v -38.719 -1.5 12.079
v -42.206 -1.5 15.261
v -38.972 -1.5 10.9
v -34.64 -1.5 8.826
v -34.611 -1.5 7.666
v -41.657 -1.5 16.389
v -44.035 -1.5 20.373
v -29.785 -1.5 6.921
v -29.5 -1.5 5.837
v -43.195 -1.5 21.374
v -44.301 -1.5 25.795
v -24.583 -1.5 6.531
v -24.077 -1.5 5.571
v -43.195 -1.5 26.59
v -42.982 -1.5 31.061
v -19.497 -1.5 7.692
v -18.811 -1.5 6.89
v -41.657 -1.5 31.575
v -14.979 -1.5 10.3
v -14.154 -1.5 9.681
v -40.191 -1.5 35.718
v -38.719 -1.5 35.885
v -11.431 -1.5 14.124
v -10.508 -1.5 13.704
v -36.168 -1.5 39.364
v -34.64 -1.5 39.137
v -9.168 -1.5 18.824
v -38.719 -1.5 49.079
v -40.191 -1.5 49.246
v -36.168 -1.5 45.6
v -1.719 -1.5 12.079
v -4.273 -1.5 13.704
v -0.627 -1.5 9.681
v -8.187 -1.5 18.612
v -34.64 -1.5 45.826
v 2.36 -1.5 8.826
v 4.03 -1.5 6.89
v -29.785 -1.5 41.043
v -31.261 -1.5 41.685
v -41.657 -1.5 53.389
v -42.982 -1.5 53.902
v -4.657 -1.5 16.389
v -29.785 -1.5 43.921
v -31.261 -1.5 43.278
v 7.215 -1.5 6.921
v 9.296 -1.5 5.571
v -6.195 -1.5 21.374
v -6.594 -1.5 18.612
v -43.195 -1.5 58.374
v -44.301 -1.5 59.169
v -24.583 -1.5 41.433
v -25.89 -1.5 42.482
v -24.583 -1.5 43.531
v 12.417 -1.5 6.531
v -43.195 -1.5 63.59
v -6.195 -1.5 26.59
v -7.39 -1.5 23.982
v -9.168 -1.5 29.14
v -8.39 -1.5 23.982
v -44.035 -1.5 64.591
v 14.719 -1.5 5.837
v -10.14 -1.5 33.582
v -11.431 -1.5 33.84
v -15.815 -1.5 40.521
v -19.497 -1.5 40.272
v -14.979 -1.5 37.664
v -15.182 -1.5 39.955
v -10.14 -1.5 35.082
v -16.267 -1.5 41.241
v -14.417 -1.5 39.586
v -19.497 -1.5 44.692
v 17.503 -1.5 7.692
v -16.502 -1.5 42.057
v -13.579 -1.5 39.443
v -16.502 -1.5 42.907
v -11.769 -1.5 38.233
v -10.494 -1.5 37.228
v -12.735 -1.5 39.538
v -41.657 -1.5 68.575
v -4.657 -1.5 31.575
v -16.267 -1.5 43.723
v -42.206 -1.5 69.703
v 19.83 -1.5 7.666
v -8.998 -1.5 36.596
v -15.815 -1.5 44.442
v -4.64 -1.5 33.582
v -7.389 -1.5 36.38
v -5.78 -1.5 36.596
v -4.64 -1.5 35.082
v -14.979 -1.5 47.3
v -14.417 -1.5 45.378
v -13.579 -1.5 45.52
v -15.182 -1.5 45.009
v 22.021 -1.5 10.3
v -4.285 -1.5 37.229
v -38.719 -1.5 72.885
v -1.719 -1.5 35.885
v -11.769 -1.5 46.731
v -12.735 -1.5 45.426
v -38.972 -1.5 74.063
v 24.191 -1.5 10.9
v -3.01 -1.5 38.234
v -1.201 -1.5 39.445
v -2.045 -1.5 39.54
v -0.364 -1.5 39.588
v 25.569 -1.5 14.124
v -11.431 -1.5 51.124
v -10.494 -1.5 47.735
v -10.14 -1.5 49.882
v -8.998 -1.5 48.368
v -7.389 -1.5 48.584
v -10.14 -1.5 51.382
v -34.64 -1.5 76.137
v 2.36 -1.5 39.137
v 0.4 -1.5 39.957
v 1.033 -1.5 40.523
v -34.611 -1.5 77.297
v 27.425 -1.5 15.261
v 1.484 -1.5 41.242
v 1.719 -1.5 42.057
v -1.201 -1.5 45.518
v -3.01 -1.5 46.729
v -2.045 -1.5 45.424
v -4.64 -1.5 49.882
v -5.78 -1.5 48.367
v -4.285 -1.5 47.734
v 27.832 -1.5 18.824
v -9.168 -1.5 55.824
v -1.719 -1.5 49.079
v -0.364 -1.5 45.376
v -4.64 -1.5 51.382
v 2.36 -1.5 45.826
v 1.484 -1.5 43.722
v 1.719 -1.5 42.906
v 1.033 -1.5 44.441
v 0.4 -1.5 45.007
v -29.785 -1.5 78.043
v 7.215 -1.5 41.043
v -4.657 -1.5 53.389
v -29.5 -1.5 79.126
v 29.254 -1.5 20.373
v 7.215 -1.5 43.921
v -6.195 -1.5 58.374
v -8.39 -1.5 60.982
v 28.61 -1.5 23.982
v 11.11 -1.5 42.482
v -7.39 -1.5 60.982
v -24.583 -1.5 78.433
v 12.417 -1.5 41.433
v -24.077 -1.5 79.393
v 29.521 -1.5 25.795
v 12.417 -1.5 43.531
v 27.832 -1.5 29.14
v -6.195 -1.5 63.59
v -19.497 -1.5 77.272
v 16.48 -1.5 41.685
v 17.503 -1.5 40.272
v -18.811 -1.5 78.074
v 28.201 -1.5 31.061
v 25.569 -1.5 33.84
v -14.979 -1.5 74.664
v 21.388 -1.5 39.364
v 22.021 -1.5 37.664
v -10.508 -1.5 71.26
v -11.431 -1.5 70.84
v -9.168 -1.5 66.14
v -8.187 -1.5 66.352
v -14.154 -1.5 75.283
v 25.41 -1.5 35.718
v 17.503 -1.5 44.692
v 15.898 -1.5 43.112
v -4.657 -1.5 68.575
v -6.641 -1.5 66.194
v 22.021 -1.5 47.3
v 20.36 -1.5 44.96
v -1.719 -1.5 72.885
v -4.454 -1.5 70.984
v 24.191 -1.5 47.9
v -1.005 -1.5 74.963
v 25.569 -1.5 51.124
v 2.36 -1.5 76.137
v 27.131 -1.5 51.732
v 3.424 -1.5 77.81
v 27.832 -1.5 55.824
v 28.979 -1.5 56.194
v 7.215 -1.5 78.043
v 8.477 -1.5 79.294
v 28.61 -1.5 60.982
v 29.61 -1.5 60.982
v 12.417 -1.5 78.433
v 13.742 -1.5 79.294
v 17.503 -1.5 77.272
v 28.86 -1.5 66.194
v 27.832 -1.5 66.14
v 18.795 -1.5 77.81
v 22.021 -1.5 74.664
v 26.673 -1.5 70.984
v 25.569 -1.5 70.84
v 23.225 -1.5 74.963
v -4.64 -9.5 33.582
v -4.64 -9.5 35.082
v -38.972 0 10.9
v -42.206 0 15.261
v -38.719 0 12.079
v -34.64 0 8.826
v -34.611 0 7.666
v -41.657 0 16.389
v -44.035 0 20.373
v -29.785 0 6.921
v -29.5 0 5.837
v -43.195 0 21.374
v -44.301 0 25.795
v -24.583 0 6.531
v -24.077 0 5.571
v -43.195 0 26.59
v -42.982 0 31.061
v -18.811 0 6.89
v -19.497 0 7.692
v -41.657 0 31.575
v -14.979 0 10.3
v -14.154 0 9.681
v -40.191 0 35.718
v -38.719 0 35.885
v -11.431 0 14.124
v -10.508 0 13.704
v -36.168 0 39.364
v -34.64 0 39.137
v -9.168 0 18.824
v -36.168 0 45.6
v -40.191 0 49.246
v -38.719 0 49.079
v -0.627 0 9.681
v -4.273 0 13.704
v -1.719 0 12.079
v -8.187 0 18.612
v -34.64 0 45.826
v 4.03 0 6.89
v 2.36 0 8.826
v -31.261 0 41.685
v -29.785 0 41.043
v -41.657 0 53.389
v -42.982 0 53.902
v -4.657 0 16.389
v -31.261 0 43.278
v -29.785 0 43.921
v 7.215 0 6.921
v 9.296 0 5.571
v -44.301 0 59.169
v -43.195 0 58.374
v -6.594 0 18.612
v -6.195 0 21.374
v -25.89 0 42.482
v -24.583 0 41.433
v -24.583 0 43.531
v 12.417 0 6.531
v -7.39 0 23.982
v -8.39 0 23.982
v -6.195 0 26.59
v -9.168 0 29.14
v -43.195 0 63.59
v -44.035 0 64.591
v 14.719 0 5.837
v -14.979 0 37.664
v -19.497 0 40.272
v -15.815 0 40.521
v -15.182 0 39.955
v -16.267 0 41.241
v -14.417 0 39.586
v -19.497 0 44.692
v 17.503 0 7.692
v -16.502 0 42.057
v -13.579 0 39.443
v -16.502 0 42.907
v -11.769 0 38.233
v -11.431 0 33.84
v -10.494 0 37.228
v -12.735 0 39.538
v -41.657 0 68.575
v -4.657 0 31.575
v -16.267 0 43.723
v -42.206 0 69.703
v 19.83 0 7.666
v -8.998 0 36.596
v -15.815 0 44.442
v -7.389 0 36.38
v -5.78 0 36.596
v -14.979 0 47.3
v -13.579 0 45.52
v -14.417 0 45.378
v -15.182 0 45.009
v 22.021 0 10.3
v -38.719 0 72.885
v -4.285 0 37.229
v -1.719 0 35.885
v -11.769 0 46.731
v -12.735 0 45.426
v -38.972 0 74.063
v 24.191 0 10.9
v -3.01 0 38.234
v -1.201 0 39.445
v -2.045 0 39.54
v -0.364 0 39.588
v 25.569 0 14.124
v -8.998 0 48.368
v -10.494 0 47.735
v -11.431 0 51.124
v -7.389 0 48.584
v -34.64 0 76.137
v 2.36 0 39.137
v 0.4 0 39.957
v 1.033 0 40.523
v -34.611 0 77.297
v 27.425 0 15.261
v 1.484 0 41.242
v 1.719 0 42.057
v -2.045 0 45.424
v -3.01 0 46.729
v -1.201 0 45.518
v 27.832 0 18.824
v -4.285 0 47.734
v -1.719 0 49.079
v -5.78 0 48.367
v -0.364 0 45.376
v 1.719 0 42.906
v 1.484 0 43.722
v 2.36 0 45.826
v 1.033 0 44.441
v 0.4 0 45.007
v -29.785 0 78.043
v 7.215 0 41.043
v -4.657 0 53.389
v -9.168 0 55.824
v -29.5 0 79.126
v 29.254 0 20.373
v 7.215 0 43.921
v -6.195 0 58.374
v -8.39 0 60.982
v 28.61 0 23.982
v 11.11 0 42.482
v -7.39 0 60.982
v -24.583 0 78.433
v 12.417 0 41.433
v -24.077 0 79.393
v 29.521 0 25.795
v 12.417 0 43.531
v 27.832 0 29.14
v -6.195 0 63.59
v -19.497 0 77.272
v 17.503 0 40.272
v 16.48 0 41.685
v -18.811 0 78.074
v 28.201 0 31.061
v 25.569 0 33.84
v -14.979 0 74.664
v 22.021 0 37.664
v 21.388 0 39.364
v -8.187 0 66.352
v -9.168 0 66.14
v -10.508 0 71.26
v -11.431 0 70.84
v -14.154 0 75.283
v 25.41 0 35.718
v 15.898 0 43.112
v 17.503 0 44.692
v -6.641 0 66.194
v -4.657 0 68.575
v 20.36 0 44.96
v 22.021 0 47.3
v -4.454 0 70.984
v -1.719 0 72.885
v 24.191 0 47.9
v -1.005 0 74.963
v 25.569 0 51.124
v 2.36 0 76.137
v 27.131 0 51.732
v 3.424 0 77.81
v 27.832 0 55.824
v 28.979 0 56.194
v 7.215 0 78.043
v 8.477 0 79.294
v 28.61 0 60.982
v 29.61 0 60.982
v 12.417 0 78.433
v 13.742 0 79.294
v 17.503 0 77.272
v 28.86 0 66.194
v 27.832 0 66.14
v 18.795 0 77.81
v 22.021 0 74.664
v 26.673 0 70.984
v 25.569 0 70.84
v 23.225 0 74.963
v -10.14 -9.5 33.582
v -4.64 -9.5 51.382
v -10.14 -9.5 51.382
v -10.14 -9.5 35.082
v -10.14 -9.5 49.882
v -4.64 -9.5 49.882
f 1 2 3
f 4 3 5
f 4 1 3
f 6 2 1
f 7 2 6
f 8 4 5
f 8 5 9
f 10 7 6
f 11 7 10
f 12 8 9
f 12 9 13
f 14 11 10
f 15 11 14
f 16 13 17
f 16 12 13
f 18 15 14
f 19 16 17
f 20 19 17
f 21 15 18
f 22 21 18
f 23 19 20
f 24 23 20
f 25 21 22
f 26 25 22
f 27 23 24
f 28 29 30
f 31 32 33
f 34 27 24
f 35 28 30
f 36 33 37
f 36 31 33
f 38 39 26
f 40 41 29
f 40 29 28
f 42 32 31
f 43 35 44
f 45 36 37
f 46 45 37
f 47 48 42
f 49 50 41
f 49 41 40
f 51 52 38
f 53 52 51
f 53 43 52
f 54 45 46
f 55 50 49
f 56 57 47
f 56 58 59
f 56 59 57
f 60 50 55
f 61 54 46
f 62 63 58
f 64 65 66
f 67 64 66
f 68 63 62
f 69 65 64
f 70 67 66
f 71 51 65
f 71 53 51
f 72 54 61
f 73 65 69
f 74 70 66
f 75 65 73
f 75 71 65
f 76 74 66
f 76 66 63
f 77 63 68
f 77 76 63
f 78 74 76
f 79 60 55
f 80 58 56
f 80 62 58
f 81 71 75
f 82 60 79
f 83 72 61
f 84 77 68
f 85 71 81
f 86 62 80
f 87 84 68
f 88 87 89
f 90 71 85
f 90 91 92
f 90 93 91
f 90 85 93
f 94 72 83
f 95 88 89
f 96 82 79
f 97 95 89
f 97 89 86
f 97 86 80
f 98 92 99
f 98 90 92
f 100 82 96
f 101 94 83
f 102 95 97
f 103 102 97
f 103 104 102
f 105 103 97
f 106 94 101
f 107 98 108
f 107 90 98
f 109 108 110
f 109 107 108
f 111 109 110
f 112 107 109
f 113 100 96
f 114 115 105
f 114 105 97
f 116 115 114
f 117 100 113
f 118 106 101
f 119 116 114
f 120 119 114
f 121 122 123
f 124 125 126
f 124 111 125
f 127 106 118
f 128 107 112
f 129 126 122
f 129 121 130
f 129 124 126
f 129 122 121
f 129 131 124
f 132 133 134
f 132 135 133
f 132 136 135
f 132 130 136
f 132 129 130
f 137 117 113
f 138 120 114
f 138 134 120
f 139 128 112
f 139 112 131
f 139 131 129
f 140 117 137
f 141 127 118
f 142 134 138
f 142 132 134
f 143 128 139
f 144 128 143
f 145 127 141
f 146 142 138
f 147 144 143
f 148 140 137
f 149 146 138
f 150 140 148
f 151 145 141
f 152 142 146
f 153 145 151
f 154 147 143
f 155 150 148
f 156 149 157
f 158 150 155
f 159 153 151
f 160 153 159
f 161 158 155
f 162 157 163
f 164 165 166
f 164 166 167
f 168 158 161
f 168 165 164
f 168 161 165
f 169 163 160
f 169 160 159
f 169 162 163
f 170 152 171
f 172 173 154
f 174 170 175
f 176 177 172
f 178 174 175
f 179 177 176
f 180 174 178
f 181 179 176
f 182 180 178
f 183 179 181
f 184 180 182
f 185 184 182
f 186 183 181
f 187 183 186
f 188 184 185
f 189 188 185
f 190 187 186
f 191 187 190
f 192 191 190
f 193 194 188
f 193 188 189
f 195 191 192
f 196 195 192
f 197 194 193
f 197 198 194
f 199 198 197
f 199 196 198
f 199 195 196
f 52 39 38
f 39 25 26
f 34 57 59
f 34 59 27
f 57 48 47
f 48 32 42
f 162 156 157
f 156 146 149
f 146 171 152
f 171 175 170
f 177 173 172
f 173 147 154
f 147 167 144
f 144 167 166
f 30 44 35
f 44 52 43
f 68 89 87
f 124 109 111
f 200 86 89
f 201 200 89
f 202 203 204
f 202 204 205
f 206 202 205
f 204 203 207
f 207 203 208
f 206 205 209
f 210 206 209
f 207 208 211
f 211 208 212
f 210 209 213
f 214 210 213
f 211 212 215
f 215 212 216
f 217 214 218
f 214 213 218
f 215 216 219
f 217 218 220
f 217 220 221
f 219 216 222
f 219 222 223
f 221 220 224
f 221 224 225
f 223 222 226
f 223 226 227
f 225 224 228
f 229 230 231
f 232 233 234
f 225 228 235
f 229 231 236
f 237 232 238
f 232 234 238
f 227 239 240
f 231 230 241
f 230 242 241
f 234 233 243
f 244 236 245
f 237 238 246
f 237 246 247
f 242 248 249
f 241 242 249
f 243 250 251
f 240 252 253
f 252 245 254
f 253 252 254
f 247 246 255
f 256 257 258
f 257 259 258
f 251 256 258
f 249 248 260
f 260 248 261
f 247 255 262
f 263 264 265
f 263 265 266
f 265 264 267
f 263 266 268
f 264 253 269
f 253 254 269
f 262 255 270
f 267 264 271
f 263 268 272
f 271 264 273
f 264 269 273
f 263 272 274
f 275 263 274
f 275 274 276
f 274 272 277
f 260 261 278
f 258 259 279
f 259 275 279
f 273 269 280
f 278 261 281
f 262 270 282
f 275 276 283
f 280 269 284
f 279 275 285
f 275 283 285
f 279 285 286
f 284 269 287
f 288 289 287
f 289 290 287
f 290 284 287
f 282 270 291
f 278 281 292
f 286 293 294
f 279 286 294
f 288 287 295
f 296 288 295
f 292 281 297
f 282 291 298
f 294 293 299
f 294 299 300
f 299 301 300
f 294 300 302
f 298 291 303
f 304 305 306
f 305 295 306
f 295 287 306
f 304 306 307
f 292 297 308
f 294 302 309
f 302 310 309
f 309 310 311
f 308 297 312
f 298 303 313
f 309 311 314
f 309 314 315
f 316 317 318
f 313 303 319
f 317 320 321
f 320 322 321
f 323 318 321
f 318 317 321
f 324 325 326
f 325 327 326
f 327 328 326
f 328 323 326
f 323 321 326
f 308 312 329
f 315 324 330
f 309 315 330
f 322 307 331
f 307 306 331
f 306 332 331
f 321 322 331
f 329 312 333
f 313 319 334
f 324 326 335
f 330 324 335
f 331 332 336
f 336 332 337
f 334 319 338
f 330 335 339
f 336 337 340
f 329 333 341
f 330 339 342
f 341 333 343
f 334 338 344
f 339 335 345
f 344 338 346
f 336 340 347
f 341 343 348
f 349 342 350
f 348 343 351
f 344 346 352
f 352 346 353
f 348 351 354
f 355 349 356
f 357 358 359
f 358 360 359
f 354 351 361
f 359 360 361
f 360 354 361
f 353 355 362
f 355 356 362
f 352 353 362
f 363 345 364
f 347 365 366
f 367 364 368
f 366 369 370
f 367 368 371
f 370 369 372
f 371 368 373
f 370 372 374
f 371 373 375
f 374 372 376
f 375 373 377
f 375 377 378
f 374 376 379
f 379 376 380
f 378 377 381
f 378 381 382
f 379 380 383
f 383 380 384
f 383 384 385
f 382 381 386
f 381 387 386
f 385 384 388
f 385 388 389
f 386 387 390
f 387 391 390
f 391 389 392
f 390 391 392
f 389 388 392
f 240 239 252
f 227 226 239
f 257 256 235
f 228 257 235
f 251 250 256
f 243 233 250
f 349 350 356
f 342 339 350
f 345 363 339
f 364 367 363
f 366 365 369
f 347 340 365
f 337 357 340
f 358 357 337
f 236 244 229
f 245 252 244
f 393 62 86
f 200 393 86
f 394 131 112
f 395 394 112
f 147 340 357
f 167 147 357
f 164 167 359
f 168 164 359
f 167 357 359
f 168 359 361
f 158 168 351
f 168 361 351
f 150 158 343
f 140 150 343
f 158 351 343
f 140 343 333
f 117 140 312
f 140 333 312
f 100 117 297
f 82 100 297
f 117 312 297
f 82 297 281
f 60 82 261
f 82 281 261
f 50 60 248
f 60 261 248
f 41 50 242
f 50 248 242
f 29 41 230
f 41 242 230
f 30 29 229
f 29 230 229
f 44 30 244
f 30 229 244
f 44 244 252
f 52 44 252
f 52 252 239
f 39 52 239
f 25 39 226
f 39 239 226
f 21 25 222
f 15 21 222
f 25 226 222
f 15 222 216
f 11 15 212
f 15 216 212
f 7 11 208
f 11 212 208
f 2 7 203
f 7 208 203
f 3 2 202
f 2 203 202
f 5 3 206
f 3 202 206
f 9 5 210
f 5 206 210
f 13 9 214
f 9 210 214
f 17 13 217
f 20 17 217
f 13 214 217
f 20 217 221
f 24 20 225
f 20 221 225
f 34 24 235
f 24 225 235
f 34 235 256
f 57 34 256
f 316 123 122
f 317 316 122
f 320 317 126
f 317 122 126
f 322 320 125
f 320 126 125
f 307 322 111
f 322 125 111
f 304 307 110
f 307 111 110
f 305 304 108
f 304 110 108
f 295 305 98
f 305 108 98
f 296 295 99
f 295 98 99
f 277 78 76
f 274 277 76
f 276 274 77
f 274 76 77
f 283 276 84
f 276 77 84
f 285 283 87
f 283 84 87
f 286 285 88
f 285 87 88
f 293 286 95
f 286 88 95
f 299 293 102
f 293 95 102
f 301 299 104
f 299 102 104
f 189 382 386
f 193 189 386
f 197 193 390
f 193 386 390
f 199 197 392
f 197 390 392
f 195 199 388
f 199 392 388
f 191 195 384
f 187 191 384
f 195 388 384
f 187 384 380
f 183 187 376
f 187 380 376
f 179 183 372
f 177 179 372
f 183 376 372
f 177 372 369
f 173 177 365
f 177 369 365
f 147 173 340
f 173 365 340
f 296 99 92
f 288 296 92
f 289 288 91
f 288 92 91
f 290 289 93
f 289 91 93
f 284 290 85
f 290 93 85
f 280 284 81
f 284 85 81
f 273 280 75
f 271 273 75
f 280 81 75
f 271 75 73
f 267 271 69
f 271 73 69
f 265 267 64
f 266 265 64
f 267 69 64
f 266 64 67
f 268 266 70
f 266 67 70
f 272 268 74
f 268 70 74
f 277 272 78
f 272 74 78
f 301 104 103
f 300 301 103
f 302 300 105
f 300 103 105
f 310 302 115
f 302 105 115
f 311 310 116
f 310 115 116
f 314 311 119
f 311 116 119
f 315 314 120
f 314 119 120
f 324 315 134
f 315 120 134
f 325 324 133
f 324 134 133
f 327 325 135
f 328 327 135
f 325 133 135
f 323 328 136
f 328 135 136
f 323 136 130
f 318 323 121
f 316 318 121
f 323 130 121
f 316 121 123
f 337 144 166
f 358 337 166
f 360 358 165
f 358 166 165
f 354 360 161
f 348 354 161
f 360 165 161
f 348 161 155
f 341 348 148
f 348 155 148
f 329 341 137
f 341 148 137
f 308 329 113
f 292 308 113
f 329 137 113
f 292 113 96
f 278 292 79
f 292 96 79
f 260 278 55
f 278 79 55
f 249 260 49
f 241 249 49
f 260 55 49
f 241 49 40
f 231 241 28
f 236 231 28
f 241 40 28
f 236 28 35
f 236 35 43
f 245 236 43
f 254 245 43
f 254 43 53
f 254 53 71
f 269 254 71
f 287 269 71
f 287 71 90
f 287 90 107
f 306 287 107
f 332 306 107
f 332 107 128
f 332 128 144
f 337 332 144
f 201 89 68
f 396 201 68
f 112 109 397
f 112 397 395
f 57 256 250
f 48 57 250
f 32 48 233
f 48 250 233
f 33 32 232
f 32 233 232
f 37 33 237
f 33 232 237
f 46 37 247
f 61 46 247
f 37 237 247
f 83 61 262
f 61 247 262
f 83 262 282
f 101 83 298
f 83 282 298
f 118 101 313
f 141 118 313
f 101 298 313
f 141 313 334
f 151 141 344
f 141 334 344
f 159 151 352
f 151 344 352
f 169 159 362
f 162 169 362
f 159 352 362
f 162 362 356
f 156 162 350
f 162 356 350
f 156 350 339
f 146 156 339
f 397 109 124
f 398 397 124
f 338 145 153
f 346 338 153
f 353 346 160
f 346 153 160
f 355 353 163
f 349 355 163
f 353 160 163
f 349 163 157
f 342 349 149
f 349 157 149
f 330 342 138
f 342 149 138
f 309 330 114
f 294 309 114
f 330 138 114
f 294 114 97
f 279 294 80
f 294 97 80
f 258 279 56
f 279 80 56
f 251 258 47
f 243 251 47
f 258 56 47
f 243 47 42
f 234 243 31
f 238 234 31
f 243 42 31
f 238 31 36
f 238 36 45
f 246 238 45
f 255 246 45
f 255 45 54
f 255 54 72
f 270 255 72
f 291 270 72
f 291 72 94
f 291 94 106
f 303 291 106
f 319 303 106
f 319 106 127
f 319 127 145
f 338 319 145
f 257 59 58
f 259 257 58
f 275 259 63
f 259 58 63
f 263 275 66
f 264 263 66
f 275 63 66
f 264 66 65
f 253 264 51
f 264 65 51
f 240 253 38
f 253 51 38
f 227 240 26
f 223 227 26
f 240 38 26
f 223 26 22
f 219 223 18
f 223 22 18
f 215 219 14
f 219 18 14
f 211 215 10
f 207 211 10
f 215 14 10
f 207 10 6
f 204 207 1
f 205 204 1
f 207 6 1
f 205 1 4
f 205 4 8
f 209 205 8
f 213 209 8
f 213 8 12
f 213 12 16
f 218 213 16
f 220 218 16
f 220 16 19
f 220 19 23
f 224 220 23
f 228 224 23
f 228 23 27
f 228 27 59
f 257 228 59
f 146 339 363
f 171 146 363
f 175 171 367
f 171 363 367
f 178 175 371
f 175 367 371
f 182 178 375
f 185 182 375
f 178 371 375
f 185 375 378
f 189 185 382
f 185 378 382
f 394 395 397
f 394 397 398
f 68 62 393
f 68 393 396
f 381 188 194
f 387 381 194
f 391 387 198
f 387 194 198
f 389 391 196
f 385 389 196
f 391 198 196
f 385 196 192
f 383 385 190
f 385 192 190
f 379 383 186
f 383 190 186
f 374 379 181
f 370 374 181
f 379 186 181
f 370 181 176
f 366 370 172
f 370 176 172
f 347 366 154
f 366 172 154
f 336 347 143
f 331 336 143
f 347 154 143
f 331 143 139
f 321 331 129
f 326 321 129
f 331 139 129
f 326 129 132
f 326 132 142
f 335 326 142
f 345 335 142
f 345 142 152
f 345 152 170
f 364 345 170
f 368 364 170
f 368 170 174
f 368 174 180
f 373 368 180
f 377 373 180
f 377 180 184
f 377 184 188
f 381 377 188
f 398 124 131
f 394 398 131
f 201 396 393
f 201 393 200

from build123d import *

# Parameters (mm, degrees)
F1_DEPTH = 1.5
F2_R     = 17.5
F3_DEPTH = 1.501
F4_W     = 2.75
F4_H     = 1.5
F5_DEPTH = 8
F7_DEPTH = 1.501


with BuildPart() as f1:
    # F0 (on Front) → F1 (new body)
    with BuildSketch(Plane.XZ):
        with BuildLine():
            ThreePointArc((-25.8904117895, 42.4818245173), (-38.971887268, 10.9003490722), (-7.3904118091, 23.9818245173))
            ThreePointArc((-7.3904118091, 23.9818245173), (-12.8089363502, 37.0632999623), (-25.8904117895, 42.4818245173))
        make_face()
        with BuildLine():
            ThreePointArc((11.1095881909, 42.4818245173), (-1.971887261, 37.0632999692), (-7.3904118091, 23.9818245173))
            ThreePointArc((-7.3904118091, 23.9818245173), (11.1095881909, 5.4818245173), (29.6095881909, 23.9818245173))
            ThreePointArc((29.6095881909, 23.9818245173), (24.1910636429, 37.0632999692), (11.1095881909, 42.4818245173))
        make_face()
        with BuildLine():
            ThreePointArc((-25.8904117895, 42.4818245173), (-12.8089363502, 37.0632999623), (-7.3904118091, 23.9818245173))
            ThreePointArc((-7.3904118091, 23.9818245173), (-1.971887261, 37.0632999692), (11.1095881909, 42.4818245173))
            ThreePointArc((11.1095881909, 42.4818245173), (-1.971887261, 47.9003490653), (-7.3904118091, 60.9818245173))
            ThreePointArc((-7.3904118091, 60.9818245173), (-12.8089363502, 47.9003490722), (-25.8904117895, 42.4818245173))
        make_face()
        with BuildLine():
            ThreePointArc((-7.3904118091, 60.9818245173), (-38.971887268, 74.0632999623), (-25.8904117895, 42.4818245173))
            ThreePointArc((-25.8904117895, 42.4818245173), (-12.8089363502, 47.9003490722), (-7.3904118091, 60.9818245173))
        make_face()
        with BuildLine():
            ThreePointArc((-7.3904118091, 60.9818245173), (-1.971887261, 47.9003490653), (11.1095881909, 42.4818245173))
            ThreePointArc((11.1095881909, 42.4818245173), (24.1910636429, 47.9003490653), (29.6095881909, 60.9818245173))
            ThreePointArc((29.6095881909, 60.9818245173), (11.1095881909, 79.4818245173), (-7.3904118091, 60.9818245173))
        make_face()
    extrude(amount=F1_DEPTH)

    # F2 (on face) → F3 (cut, through all)
    with BuildSketch(Plane.XZ.offset(1.5)):
        with Locations((-25.8904118091, 60.9818245173)):
            Circle(F2_R)
        with Locations((-25.8904118091, 23.9818245173)):
            Circle(F2_R)
        with Locations((11.1095881909, 60.9818245173)):
            Circle(F2_R)
        with Locations((11.1095881909, 23.9818245173)):
            Circle(F2_R)
    extrude(amount=-F3_DEPTH, mode=Mode.SUBTRACT)

    # F4 (on face) → F5 (join)
    with BuildSketch(Plane.XZ.offset(1.5)):
        with Locations((-6.0154118091, 34.3318245173)):
            Rectangle(F4_W, F4_H)
        with Locations((-8.7654118091, 34.3318245173)):
            Rectangle(F4_W, F4_H)
        with Locations((-8.7654118091, 50.6318245173)):
            Rectangle(F4_W, F4_H)
        with Locations((-6.0154118091, 50.6318245173)):
            Rectangle(F4_W, F4_H)
    extrude(amount=F5_DEPTH)

    # F6 (on face) → F7 (cut, through all)
    with BuildSketch(Plane.XZ.offset(1.5)):
        with BuildLine():
            ThreePointArc((-12.7348604006, 45.4258701055), (-16.5319645782, 42.4818245173), (-12.7348604006, 39.537778929))
            ThreePointArc((-12.7348604006, 39.537778929), (-7.3893052189, 36.3801416389), (-2.0448957156, 39.5397176417))
            ThreePointArc((-2.0448957156, 39.5397176417), (1.7489974946, 42.4818245173), (-2.0448957156, 45.4239313928))
            ThreePointArc((-2.0448957156, 45.4239313928), (-7.3893052189, 48.5835073956), (-12.7348604006, 45.4258701055))
        make_face()
    extrude(amount=-F7_DEPTH, mode=Mode.SUBTRACT)


solid = f1.part
